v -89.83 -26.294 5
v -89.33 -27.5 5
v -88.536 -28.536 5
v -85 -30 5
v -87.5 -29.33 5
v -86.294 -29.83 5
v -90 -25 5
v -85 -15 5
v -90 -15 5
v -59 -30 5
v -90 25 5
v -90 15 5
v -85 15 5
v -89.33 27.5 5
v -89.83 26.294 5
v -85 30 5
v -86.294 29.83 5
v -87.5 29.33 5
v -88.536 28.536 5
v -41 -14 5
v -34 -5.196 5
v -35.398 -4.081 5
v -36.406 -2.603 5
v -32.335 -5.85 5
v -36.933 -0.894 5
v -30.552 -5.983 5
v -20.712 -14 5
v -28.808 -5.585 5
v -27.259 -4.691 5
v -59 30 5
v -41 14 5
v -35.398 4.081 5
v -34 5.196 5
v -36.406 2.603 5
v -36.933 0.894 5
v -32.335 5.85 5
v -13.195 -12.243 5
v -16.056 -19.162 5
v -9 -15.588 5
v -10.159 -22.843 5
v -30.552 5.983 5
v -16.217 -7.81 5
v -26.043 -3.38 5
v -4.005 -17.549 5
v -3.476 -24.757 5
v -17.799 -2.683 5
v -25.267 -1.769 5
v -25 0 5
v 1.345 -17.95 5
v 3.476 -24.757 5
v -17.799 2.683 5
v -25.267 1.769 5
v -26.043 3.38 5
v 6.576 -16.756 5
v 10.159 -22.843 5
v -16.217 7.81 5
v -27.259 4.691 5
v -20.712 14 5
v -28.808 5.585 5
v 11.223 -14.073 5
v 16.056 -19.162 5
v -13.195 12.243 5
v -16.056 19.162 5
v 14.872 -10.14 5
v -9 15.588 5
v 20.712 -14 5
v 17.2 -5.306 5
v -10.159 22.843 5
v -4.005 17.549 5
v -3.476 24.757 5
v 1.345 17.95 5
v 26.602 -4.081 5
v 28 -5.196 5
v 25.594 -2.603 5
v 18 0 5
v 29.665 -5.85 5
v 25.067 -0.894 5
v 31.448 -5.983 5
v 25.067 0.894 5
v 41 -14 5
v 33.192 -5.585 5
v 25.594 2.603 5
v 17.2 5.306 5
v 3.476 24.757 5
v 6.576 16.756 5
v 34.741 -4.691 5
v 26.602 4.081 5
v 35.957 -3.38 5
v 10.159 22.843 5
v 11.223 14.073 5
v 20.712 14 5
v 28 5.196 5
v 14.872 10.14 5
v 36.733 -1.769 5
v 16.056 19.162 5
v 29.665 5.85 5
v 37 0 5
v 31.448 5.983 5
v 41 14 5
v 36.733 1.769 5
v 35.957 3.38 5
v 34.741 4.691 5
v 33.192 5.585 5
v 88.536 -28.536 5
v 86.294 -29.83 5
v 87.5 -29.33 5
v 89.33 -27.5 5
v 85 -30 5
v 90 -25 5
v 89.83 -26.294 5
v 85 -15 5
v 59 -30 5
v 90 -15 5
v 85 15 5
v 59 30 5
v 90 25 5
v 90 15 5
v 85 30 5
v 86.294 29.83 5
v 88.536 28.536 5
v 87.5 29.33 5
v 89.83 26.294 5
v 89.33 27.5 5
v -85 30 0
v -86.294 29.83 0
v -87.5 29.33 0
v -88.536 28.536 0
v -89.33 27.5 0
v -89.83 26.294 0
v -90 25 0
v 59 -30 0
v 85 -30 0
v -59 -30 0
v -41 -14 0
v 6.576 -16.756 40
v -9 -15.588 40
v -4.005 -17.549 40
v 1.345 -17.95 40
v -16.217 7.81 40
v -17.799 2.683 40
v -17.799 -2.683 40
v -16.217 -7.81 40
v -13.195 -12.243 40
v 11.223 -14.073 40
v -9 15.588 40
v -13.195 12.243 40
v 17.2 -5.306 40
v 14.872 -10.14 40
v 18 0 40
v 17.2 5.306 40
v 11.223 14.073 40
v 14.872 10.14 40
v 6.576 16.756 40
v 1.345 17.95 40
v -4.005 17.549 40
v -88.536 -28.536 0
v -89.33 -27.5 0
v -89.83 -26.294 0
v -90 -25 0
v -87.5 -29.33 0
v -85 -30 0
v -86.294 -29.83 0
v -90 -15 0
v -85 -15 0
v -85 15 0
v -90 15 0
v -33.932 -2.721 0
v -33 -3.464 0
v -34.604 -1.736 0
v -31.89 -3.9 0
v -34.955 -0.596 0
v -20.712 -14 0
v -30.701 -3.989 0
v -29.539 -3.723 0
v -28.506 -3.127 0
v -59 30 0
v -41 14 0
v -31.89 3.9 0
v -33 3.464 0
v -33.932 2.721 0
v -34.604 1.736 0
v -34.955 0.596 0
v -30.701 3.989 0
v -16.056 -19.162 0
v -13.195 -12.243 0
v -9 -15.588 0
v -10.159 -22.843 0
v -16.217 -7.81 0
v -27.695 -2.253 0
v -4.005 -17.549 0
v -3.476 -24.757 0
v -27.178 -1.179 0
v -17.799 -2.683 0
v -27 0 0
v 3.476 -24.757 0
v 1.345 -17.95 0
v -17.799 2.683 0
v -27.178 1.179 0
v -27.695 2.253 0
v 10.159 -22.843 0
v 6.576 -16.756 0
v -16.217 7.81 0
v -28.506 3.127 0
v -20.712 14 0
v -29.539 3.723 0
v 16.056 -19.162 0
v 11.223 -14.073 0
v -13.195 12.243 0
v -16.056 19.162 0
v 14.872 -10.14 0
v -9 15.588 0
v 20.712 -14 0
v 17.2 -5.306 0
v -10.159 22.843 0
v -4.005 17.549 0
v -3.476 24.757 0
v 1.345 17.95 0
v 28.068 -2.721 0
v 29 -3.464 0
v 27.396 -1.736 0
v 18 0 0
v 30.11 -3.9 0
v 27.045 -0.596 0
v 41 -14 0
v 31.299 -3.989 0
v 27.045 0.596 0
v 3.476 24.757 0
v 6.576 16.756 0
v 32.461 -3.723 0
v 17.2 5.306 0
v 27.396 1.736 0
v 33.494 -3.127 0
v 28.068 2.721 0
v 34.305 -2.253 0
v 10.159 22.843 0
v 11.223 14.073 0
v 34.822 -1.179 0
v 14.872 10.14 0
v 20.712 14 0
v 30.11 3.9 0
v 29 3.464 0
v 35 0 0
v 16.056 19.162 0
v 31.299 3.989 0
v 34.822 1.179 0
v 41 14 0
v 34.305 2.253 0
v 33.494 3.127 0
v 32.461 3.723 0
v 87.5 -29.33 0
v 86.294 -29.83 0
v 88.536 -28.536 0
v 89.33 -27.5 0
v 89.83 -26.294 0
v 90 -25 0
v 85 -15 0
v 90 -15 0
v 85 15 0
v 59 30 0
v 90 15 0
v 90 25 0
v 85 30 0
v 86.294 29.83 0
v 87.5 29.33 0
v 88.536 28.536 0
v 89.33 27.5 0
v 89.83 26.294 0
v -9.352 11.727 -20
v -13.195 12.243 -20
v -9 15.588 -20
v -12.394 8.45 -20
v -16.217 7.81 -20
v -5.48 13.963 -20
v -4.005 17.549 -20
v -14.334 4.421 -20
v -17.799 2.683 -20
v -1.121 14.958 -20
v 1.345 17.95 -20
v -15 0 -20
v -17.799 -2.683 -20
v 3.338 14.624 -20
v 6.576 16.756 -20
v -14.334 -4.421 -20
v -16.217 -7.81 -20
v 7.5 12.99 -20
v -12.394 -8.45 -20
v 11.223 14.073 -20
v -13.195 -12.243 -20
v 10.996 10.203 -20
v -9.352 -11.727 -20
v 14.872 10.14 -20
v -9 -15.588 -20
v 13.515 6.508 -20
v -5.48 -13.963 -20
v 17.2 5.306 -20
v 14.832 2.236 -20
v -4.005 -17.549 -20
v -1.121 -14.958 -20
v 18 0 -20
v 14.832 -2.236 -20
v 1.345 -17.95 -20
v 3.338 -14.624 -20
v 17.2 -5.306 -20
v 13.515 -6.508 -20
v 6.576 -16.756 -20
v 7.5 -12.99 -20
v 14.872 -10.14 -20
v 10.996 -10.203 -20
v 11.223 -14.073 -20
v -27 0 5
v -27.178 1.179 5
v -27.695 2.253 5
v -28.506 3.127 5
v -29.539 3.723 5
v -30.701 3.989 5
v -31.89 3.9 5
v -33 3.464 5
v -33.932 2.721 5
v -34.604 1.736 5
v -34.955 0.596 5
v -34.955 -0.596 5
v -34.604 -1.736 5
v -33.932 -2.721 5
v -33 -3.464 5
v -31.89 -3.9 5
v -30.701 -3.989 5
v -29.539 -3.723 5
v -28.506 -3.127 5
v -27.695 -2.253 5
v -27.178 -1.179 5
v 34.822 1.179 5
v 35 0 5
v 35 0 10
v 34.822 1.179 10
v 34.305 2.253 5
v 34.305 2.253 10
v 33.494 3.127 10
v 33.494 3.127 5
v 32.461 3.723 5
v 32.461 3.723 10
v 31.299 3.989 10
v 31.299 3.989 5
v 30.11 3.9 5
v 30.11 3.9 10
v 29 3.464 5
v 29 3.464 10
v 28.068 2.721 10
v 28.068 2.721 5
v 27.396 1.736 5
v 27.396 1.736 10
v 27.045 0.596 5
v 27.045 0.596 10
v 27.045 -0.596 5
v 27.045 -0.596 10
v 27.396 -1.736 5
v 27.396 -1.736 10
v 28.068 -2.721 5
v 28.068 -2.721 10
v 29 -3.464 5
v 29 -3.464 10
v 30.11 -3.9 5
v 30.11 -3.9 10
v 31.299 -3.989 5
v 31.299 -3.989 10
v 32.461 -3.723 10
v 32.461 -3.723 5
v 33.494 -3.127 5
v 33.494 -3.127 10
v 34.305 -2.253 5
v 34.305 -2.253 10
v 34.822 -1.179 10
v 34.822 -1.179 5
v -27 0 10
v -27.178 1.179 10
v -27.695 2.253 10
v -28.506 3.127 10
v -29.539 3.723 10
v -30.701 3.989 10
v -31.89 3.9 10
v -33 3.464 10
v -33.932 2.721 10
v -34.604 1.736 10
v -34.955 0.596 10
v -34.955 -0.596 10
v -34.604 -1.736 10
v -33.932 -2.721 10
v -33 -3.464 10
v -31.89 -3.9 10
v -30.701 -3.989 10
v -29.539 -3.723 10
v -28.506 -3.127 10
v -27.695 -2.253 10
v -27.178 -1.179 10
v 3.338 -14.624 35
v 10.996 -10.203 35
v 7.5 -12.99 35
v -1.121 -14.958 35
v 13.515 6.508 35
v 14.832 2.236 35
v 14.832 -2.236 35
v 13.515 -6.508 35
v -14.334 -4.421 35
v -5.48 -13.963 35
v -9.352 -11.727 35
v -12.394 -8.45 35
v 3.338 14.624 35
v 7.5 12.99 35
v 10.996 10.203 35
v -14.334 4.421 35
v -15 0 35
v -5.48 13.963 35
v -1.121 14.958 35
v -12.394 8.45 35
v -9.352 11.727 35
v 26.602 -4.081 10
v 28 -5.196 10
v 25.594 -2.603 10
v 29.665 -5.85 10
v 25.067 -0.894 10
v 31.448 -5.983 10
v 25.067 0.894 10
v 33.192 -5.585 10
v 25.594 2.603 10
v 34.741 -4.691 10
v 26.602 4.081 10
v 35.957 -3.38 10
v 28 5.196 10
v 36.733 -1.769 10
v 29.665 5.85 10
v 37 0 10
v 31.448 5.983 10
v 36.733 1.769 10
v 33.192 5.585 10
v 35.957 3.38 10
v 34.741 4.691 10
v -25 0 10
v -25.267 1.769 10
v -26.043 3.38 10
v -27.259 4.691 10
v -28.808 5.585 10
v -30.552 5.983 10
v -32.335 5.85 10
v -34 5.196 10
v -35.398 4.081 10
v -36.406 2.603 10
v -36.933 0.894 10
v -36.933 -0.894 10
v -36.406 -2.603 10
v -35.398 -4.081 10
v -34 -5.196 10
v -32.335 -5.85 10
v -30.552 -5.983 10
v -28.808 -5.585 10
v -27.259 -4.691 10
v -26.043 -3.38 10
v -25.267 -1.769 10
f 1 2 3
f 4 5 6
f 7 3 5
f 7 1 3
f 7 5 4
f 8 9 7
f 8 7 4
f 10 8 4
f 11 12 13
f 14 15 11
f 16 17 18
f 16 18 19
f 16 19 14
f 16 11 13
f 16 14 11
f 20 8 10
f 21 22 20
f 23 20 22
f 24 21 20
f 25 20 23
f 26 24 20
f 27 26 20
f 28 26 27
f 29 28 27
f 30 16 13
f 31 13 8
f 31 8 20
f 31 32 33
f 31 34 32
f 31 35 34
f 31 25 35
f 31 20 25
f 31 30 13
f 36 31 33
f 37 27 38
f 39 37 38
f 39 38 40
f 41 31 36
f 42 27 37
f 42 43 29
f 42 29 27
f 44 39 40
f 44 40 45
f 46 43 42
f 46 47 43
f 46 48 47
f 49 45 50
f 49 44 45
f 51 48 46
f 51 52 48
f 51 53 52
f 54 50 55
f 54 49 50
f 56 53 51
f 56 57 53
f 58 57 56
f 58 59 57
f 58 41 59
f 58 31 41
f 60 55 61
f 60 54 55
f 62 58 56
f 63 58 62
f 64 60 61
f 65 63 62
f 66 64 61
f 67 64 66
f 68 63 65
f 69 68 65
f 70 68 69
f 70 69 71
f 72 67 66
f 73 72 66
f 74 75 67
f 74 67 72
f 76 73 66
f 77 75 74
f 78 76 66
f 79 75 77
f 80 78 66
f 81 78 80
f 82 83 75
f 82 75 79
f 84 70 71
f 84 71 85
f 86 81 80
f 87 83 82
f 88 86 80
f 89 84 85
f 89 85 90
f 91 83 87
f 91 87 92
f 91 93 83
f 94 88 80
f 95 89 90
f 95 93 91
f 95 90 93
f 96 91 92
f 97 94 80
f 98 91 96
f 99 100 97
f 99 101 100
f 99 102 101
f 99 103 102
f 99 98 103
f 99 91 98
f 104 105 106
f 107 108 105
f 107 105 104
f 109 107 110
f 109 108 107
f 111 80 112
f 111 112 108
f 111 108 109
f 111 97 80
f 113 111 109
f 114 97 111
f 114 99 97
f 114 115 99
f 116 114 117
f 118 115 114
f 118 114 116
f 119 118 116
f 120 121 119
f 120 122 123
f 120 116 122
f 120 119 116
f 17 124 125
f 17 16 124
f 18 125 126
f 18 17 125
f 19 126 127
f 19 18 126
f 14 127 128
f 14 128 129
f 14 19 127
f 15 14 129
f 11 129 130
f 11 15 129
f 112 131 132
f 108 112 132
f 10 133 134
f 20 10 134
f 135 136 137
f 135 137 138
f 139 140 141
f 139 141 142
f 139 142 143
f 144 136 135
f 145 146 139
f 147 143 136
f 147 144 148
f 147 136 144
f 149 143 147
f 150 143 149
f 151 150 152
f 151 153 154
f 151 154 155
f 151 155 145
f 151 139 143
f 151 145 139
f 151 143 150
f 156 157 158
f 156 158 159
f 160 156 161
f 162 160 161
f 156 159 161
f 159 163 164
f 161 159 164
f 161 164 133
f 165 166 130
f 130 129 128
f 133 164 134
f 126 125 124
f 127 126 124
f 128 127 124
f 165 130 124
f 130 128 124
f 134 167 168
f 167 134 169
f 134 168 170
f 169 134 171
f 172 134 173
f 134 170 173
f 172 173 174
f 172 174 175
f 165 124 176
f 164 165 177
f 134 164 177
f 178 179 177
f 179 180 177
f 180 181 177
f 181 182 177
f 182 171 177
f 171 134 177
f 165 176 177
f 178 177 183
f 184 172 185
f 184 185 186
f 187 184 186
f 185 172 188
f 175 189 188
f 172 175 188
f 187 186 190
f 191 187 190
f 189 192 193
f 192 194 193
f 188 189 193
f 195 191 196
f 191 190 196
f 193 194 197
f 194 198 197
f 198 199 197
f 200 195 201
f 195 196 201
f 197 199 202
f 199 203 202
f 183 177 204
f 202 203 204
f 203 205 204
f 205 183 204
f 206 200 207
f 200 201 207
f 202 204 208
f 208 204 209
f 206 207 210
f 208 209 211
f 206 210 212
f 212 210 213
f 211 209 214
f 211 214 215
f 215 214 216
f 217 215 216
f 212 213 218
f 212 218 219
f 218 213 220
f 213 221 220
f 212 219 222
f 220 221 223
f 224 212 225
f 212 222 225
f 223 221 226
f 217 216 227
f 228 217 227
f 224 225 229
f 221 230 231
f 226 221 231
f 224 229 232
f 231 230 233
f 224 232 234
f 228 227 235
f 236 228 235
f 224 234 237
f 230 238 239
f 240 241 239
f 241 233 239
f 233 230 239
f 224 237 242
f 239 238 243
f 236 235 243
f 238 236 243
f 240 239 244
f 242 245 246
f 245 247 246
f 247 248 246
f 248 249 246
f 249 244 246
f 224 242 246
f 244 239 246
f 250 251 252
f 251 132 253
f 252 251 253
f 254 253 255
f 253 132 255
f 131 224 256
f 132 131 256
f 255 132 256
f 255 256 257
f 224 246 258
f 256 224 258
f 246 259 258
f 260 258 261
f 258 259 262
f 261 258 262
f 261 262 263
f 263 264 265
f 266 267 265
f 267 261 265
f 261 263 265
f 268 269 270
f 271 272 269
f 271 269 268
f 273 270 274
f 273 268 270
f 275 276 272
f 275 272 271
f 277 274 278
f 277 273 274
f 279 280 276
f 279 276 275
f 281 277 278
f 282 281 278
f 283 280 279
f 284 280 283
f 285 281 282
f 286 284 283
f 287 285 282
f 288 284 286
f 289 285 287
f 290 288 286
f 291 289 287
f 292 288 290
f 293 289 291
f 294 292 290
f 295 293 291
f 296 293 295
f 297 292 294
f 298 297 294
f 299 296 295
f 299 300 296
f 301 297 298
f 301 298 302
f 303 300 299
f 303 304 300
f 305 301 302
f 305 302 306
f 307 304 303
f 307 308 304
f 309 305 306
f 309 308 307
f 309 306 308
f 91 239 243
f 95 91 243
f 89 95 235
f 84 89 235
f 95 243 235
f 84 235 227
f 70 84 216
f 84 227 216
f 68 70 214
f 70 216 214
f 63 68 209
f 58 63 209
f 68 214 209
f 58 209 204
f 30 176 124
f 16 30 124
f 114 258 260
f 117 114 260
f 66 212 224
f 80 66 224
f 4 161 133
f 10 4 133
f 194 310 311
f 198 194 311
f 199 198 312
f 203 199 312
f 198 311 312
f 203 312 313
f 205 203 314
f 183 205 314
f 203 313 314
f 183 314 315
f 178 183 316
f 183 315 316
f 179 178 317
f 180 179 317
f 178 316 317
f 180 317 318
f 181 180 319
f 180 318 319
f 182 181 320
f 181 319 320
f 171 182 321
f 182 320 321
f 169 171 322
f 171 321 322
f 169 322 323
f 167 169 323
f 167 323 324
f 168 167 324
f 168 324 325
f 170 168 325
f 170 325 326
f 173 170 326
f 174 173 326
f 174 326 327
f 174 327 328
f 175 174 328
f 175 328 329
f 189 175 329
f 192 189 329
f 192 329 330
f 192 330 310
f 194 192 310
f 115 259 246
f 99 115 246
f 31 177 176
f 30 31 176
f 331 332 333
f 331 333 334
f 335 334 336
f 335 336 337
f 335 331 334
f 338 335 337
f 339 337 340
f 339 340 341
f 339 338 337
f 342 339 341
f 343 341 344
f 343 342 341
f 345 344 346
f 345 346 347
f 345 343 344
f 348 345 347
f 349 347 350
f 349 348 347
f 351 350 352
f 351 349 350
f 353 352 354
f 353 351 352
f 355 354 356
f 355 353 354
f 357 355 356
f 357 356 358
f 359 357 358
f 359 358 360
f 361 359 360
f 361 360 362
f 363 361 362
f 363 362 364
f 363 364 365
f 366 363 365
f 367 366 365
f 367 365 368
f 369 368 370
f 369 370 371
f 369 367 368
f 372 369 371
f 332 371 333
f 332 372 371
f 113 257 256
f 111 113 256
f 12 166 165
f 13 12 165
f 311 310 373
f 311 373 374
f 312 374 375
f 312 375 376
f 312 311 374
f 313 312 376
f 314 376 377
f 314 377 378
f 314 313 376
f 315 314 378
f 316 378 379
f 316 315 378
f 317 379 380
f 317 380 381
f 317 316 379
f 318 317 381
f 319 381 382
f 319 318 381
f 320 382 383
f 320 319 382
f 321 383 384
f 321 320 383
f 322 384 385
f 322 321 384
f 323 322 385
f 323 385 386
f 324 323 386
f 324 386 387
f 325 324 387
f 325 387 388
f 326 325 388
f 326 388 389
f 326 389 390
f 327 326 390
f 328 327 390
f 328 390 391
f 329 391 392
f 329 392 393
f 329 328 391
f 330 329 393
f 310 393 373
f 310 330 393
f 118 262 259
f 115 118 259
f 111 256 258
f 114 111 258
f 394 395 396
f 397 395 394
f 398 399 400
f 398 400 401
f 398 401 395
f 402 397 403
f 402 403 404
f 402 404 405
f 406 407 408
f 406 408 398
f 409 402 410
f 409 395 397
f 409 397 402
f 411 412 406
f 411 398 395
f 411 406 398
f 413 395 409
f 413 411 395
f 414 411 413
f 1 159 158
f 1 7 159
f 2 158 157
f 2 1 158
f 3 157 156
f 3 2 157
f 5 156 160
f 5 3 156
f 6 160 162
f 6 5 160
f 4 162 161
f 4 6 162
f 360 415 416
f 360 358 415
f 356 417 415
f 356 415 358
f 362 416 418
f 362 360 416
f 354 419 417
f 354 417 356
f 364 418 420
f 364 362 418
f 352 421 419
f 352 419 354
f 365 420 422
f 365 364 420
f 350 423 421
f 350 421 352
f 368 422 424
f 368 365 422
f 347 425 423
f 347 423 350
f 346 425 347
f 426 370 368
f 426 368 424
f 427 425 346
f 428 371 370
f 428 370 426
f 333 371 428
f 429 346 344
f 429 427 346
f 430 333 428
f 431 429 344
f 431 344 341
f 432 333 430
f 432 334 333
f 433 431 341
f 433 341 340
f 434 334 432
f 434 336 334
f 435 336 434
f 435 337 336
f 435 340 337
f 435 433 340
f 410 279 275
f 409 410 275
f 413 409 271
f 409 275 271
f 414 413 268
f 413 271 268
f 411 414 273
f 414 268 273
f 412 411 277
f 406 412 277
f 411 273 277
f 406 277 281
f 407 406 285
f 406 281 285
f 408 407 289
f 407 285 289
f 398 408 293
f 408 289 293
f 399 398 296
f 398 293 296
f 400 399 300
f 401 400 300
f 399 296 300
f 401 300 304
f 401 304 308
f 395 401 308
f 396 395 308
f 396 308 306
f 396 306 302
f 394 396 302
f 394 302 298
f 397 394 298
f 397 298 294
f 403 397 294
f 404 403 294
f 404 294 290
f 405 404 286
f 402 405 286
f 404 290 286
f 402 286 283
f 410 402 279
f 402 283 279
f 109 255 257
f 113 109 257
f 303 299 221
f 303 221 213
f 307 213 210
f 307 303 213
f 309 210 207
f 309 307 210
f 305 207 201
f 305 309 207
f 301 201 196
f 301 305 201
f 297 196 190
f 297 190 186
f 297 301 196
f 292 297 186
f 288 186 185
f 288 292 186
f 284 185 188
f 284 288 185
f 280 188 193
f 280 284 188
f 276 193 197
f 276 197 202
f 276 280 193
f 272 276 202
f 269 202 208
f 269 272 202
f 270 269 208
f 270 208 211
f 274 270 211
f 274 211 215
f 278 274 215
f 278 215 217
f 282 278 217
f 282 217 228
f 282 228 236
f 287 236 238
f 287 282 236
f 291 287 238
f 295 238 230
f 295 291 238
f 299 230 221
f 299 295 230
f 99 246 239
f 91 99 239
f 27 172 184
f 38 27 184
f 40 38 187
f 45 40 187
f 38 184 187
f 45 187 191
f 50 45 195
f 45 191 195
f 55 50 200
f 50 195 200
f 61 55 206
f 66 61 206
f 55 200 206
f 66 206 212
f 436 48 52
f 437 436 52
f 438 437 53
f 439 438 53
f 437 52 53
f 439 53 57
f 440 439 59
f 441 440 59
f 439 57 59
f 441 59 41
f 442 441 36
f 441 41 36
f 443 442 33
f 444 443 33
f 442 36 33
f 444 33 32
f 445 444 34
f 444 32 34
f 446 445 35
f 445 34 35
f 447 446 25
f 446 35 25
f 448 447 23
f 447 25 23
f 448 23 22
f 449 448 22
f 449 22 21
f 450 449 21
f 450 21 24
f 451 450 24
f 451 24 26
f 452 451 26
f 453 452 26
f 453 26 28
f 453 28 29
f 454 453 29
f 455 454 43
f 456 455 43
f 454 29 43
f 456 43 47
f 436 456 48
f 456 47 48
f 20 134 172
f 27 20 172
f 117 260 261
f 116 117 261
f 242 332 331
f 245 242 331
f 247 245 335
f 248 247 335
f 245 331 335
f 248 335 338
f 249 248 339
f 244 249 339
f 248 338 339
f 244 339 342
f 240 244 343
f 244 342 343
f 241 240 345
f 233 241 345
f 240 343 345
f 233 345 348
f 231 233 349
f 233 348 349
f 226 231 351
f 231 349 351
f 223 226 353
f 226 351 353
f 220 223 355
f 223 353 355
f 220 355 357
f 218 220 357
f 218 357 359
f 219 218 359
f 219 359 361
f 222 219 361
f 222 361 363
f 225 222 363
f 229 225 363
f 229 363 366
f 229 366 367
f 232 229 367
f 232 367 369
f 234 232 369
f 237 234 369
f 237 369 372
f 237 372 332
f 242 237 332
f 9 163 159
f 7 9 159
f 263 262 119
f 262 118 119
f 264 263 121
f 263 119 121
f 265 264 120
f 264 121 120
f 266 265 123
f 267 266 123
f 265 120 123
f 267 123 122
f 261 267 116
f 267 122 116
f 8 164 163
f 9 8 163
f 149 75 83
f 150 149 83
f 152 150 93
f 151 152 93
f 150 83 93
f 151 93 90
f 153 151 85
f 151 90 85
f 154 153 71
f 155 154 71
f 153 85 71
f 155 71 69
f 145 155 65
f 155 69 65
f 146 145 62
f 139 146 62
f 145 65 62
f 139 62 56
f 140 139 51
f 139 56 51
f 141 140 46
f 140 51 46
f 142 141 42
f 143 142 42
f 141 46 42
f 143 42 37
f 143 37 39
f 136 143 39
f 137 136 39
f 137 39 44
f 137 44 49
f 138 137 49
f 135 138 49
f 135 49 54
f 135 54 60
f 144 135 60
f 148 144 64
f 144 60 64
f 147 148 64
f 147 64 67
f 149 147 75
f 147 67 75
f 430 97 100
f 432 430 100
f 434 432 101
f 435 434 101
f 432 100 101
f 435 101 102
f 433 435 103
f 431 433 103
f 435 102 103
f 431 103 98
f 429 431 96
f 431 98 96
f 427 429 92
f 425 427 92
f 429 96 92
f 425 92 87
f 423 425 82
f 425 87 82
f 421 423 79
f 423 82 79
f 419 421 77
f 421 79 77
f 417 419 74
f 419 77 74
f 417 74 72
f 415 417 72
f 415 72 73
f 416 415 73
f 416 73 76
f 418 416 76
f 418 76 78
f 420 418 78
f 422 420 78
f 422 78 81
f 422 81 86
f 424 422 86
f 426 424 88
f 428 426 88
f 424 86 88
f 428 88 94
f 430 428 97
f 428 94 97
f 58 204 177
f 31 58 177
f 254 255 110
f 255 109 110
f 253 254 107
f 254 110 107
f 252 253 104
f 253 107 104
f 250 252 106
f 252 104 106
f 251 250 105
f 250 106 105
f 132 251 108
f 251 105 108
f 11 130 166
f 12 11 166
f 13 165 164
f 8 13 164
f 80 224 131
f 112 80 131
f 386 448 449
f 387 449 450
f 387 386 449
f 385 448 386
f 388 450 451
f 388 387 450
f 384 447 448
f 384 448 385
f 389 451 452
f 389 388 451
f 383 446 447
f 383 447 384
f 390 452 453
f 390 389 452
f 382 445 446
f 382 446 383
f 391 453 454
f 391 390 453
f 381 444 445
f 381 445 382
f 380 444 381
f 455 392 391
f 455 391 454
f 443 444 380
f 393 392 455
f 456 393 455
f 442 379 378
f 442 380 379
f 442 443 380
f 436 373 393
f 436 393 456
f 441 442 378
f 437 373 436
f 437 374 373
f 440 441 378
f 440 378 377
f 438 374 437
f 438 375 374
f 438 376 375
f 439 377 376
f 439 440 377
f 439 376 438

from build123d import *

# Parameters (mm, degrees)
EXTRUDE_1_DEPTH     = 5
SKETCH_2_R          = 18
EXTRUDE_2_DEPTH     = 35
EXTRUDE_START       = 20
SKETCH_3_R          = 18
EXTRUDE_3_DEPTH     = 20
SKETCH_4_R          = 15
CUT_EXTRUDE_1_DEPTH = 55
SKETCH_5_R          = 6
SKETCH_5_R_2        = 4
EXTRUDE_4_DEPTH     = 5
CUT_EXTRUDE_2_REACH = 103.119
SKETCH_6_R          = 4
FILLET_1_R          = 5


with BuildPart() as part:
    # 草图1 → 凸台-拉伸1 (new body)
    with BuildSketch(Plane.XY):
        with BuildLine():
            Line((-20.712315177, 14), (-41, 14))
            Line((-41, 14), (-59, 30))
            Line((-59, 30), (-90, 30))
            Line((-90, 30), (-90, 15))
            Line((-90, 15), (-85, 15))
            Line((-85, 15), (-85, -15))
            Line((-85, -15), (-90, -15))
            Line((-90, -15), (-90, -30))
            Line((-90, -30), (-59, -30))
            Line((-59, -30), (-41, -14))
            Line((-41, -14), (-20.712315177, -14))
            ThreePointArc((-20.712315177, -14), (0, -25), (20.712315177, -14))
            Line((20.712315177, -14), (41, -14))
            Line((41, -14), (59, -30))
            Line((59, -30), (90, -30))
            Line((90, -30), (90, -15))
            Line((90, -15), (85, -15))
            Line((85, -15), (85, 15))
            Line((85, 15), (90, 15))
            Line((90, 15), (90, 30))
            Line((90, 30), (59, 30))
            Line((59, 30), (41, 14))
            Line((41, 14), (20.712315177, 14))
            ThreePointArc((20.712315177, 14), (0, 25), (-20.712315177, 14))
        make_face()
    extrude(amount=EXTRUDE_1_DEPTH)

    # 草图2 → 凸台-拉伸2 (add)
    with BuildSketch(Plane.XY.offset(5)):
        Circle(SKETCH_2_R)
    extrude(amount=EXTRUDE_2_DEPTH)

    # 草图3 → 凸台-拉伸3 (add)
    with BuildSketch(Plane(origin=(0, 0, 0), x_dir=(-1, 0, 0), z_dir=(0, 0, -1)).offset(EXTRUDE_START)):
        with Locations(Location((0, 0, 0), (0, 0, 180))):
            Circle(SKETCH_3_R)
    extrude(amount=-EXTRUDE_3_DEPTH)

    # 草图4 → 切除-拉伸1 (cut)
    with BuildSketch(Plane(origin=(0, 0, -20), x_dir=(-1, 0, 0), z_dir=(0, 0, -1))):
        Circle(SKETCH_4_R)
    extrude(amount=-CUT_EXTRUDE_1_DEPTH, mode=Mode.SUBTRACT)

    # 草图5 → 凸台-拉伸4 (add)
    # profile 1 of 2: a face of its own
    with BuildSketch(Plane.XY.offset(5)):
        with Locations((-31, 0)):
            Circle(SKETCH_5_R)
        with Locations((-31, 0)):
            Circle(SKETCH_5_R_2, mode=Mode.SUBTRACT)
    # profile 2 of 2: a face of its own
    with BuildSketch(Plane.XY.offset(5)):
        with Locations((31, 0)):
            Circle(SKETCH_5_R)
        with Locations((31, 0)):
            Circle(SKETCH_5_R_2, mode=Mode.SUBTRACT)
    extrude(amount=EXTRUDE_4_DEPTH)

    # 草图6 → 切除-拉伸2 (cut, up to next)
    with BuildSketch(Plane.XY.offset(5), mode=Mode.PRIVATE) as cut_extrude_2_sk1:
        with Locations((31, 0)):
            Circle(SKETCH_6_R)
    cut_extrude_2_tool1 = extrude(cut_extrude_2_sk1.sketch, amount=-CUT_EXTRUDE_2_REACH, mode=Mode.PRIVATE) & part.part
    # 草图6 → 切除-拉伸2 (cut, up to next)
    with BuildSketch(Plane.XY.offset(5), mode=Mode.PRIVATE) as cut_extrude_2_sk2:
        with Locations((-31, 0)):
            Circle(SKETCH_6_R)
    cut_extrude_2_tool2 = extrude(cut_extrude_2_sk2.sketch, amount=-CUT_EXTRUDE_2_REACH, mode=Mode.PRIVATE) & part.part
    add(cut_extrude_2_tool1.solids().sort_by_distance((31, 0, 5))[0], mode=Mode.SUBTRACT)
    add(cut_extrude_2_tool2.solids().sort_by_distance((-31, 0, 5))[0], mode=Mode.SUBTRACT)

    # 圆角1
    fillet_1_edges = [part.edges().sort_by_distance(p)[0] for p in [
        (90, 30, 2.5),
        (90, -30, 2.5),
        (-90, -30, 2.5),
        (-90, 30, 2.5),
    ]]
    fillet(fillet_1_edges, radius=FILLET_1_R)


solid = part.part
